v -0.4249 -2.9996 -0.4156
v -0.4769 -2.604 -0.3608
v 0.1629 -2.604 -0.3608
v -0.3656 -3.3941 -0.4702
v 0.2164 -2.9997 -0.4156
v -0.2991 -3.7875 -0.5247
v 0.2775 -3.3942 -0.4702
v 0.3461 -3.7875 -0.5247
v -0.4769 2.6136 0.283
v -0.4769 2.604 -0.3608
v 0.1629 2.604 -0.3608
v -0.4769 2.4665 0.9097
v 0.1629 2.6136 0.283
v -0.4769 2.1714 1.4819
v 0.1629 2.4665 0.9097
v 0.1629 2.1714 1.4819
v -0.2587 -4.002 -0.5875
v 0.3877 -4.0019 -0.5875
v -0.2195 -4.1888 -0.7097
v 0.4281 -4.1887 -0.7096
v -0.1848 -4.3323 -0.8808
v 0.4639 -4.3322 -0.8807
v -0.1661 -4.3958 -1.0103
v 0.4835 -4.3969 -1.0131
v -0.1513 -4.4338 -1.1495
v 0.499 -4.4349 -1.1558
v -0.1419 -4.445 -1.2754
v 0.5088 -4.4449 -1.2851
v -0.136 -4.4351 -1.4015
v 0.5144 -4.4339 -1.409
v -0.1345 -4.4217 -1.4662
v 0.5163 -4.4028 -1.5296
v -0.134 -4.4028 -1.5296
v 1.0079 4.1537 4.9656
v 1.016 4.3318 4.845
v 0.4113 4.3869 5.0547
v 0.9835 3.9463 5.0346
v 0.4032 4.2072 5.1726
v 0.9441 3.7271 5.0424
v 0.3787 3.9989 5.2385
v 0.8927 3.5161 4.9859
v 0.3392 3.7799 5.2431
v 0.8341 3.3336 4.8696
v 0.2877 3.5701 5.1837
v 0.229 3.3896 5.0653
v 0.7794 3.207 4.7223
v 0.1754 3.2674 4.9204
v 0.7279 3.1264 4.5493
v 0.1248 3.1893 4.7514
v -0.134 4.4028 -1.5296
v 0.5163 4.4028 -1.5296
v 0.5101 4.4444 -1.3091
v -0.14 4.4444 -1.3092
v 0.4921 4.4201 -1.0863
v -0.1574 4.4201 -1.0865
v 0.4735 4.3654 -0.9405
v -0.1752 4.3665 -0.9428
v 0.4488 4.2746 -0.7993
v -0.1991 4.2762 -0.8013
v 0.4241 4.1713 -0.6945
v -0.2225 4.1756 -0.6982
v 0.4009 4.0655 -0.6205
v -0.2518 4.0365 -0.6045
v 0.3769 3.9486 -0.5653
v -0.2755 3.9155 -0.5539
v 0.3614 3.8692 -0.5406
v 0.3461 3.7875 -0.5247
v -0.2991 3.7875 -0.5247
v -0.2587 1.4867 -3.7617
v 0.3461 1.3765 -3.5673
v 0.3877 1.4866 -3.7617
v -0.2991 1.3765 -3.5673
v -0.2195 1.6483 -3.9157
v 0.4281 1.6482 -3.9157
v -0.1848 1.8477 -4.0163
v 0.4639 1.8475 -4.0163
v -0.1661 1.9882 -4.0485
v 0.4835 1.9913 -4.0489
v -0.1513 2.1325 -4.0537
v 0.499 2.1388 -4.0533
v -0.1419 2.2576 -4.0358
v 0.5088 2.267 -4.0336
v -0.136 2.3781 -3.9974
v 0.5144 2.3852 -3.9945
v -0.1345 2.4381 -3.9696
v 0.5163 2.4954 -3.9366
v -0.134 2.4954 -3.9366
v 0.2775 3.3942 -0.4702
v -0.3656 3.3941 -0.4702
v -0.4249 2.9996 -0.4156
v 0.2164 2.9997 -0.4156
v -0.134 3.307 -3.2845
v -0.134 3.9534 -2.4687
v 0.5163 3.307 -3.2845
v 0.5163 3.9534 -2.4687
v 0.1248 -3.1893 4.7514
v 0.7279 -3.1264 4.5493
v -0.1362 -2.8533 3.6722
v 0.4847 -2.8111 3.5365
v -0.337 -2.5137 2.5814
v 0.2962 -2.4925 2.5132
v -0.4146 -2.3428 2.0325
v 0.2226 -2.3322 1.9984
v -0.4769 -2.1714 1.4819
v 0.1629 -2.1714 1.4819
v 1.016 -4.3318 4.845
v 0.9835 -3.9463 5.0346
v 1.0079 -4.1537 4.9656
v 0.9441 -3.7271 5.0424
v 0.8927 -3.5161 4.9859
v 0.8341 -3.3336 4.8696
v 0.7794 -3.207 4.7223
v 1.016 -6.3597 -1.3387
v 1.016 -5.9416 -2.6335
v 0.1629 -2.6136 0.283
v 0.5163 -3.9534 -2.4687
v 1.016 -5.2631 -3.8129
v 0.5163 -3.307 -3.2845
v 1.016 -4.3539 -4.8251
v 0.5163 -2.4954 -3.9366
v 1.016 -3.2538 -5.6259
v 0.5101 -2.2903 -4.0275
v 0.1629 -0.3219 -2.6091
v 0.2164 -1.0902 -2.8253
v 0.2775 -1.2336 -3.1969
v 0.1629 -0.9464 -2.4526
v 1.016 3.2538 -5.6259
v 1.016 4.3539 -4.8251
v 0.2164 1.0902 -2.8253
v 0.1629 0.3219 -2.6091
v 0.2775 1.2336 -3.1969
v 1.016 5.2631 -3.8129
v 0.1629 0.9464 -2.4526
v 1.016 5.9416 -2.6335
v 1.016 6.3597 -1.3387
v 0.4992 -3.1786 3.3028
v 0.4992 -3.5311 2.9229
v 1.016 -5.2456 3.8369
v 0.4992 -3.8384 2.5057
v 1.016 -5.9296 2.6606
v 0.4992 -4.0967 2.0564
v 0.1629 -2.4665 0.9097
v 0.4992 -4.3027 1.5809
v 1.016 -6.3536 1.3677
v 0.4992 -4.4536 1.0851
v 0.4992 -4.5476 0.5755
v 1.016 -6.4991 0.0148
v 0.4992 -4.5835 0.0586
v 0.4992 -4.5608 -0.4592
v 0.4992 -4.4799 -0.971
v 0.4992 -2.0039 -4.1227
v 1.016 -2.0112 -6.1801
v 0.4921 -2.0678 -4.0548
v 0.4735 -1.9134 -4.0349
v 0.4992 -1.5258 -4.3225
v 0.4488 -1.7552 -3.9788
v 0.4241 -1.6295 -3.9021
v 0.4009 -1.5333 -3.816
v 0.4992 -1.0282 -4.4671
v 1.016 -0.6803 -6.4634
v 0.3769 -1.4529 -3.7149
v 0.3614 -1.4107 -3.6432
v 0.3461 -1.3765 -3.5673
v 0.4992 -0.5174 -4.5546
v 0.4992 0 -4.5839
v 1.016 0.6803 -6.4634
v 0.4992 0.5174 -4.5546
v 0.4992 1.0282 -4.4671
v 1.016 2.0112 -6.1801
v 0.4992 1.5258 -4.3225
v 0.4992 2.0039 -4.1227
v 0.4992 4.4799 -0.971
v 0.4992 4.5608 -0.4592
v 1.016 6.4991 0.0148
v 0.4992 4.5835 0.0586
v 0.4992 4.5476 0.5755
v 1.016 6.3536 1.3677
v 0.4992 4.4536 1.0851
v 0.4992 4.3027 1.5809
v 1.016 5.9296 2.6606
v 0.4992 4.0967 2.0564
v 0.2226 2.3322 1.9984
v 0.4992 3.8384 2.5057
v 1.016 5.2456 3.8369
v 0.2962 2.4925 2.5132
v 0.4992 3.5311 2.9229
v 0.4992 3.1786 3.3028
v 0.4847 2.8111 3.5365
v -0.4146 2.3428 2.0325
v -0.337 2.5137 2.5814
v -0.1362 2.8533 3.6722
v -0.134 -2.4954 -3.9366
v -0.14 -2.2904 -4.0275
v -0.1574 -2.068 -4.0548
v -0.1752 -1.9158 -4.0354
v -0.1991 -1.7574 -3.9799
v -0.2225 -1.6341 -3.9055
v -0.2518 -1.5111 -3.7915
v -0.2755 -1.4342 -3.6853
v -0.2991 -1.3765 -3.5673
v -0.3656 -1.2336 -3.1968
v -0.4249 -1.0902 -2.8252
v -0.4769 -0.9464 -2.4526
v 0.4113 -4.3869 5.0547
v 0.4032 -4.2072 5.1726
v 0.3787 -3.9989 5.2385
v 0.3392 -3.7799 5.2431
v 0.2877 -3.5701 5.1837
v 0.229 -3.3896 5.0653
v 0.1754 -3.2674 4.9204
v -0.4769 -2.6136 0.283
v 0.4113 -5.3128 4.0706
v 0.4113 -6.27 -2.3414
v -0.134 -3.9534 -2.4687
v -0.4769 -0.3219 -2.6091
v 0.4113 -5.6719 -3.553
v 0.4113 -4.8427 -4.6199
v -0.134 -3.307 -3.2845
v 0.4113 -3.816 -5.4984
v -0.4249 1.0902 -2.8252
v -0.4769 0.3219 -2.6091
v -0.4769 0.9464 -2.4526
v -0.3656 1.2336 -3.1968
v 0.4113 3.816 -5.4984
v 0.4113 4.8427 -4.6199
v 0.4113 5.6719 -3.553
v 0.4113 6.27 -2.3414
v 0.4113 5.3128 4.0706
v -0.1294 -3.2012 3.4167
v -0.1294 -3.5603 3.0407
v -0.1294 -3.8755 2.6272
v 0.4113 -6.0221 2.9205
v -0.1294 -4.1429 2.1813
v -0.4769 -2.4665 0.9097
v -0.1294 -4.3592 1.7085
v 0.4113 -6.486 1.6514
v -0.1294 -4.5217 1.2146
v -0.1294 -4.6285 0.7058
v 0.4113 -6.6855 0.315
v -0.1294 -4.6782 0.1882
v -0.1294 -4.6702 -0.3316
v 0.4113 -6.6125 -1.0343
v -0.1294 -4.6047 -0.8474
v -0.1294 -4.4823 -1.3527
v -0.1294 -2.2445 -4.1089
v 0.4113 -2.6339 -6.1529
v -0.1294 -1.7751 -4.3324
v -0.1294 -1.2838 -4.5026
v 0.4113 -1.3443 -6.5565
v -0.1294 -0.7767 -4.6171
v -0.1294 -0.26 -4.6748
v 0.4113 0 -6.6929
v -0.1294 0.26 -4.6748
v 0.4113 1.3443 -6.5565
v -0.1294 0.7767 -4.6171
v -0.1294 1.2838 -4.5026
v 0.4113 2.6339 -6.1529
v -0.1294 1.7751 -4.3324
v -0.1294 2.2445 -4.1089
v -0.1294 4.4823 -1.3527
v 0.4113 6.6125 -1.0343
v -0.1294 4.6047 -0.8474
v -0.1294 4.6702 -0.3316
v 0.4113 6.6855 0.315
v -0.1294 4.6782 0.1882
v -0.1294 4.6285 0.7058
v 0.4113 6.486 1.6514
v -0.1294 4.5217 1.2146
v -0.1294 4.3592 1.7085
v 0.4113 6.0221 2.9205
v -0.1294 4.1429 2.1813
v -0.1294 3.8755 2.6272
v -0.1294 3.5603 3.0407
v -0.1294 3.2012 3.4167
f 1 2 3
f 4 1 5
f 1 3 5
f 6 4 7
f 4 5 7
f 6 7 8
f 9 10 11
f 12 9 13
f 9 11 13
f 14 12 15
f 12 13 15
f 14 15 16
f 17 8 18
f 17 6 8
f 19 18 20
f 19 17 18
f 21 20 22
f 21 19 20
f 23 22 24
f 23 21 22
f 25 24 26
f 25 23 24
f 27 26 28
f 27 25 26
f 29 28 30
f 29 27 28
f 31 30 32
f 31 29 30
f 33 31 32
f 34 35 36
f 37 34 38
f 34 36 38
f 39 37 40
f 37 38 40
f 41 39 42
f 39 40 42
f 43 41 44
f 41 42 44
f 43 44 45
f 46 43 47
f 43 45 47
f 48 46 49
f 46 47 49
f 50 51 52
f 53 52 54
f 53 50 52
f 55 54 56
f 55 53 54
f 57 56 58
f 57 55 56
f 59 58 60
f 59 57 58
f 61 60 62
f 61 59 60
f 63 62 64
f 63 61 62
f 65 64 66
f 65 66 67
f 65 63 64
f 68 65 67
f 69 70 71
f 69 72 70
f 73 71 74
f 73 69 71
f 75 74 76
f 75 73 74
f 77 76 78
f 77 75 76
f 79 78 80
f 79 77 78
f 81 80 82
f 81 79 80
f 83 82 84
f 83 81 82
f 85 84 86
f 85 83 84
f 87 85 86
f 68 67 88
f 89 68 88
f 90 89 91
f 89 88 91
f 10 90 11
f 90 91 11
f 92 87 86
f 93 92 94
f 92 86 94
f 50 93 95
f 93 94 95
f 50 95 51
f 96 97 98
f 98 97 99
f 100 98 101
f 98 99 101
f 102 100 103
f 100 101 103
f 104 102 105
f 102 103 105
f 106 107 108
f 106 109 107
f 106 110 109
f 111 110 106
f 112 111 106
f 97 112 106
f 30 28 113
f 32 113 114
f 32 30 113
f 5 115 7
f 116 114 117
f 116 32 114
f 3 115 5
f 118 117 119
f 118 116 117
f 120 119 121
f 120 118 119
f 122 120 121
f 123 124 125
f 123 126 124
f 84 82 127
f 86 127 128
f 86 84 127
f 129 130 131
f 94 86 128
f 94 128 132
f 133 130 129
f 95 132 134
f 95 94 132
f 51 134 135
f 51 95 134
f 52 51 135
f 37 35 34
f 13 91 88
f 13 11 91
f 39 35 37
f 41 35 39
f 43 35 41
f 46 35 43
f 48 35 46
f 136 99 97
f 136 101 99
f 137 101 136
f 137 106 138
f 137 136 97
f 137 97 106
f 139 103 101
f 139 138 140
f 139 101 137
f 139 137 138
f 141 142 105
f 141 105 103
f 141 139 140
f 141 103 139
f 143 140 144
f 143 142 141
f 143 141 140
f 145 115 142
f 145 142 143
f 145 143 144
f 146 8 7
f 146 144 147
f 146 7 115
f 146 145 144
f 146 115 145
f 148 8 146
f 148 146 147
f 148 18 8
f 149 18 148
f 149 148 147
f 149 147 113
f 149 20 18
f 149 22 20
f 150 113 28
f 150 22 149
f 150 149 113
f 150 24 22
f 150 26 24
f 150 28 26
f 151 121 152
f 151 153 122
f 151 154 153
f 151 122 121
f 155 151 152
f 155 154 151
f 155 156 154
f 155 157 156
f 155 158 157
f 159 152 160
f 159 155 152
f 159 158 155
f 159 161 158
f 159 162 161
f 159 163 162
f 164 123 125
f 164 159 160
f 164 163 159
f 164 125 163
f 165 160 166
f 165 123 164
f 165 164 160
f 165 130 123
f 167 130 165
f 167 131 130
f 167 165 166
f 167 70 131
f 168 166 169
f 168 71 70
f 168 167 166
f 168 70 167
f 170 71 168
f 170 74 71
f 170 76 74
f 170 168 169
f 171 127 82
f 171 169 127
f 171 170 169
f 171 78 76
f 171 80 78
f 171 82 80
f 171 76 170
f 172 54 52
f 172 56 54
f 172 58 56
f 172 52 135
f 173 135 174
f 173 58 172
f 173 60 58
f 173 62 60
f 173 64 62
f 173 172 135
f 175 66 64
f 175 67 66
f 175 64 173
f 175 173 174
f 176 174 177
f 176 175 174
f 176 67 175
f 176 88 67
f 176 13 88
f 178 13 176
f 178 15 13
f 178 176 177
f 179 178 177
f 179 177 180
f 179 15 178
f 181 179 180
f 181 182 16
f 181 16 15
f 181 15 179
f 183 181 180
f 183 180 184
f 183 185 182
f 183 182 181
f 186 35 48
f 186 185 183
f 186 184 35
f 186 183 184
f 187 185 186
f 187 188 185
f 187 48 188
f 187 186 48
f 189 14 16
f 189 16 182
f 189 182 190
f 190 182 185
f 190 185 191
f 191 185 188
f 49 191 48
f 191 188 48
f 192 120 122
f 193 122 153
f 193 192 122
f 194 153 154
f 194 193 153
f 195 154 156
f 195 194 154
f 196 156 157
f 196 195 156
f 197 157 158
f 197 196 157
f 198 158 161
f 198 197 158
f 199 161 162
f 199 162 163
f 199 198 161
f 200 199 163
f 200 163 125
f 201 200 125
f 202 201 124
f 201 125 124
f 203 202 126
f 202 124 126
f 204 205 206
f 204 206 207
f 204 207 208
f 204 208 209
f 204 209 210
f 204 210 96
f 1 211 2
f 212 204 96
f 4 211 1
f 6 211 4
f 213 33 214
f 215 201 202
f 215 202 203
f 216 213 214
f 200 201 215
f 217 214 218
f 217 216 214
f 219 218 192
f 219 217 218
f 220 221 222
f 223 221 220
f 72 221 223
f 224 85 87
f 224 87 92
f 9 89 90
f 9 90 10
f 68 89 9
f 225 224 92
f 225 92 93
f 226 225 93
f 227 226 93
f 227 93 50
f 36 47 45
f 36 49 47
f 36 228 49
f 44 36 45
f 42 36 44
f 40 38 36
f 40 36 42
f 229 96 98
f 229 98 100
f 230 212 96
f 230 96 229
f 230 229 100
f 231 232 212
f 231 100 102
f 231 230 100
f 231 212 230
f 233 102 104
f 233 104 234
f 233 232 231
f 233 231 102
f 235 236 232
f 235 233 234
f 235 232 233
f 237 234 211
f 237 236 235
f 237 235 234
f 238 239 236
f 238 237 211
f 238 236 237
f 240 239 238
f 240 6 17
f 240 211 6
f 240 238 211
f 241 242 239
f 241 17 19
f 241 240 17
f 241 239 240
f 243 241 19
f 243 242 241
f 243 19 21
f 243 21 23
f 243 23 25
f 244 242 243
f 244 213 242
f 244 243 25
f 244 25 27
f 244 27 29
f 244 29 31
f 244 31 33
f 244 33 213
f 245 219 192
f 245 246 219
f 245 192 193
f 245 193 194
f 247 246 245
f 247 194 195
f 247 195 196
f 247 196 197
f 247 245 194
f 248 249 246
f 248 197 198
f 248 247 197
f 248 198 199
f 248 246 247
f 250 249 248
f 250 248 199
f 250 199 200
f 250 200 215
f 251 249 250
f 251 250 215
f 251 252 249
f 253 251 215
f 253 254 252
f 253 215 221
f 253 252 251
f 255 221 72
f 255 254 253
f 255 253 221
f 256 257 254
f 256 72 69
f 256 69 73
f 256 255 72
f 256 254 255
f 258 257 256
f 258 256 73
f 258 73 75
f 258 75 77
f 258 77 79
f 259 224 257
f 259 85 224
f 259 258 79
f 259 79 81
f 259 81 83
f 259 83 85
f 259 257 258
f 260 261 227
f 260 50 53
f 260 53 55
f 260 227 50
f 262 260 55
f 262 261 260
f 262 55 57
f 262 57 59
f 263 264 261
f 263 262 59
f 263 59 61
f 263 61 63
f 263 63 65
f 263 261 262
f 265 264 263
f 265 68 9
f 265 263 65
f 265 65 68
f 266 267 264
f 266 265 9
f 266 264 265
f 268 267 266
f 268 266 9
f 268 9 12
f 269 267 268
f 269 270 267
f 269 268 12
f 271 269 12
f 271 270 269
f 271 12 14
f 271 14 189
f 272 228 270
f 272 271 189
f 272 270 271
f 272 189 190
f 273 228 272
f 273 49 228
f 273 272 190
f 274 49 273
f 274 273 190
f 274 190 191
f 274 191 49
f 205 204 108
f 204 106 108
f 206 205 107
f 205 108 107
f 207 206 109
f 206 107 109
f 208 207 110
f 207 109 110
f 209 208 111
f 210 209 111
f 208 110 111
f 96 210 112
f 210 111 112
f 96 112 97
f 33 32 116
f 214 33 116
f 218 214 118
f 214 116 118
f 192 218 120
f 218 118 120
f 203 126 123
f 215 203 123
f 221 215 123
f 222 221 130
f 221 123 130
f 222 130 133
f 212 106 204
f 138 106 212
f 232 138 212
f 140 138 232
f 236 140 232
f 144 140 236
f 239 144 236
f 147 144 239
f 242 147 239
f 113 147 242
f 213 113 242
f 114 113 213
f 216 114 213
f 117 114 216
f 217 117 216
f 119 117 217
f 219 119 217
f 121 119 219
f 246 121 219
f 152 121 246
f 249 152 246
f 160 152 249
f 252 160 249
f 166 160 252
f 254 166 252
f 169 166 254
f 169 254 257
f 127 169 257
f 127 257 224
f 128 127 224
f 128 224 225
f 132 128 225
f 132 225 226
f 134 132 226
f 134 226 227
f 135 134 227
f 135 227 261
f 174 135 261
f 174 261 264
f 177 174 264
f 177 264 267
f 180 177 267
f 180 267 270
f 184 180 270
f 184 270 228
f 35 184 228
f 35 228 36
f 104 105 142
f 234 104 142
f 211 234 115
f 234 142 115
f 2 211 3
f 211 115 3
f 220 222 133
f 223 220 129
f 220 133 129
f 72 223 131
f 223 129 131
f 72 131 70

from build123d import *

# Parameters (mm, degrees)
CUT_EXTRUDE1_DEPTH = 10.608101884
FILLET1_R          = 0.762


with BuildPart() as part:
    # Sketch2 → Revolve1 (revolve)
    with BuildSketch(Plane(origin=(0, 0, 0), x_dir=(1, 0, 0), z_dir=(0, 1, 0)), mode=Mode.PRIVATE) as revolve1_sk:
        with BuildLine():
            Line((0.41129695, 6.6929), (1.016, 6.499097983))
            ThreePointArc((1.016, 6.499097983), (0.255533191, 3.289016973), (0, 0))
            Line((0, 0), (-0.635, 0))
            ThreePointArc((-0.635, 0), (-0.371846852, 3.38709491), (0.41129695, 6.6929))
        make_face()
    revolve(revolve1_sk.sketch.rotate(Axis((0, 0, 0), (1, 0, 0)), 180), axis=Axis((0, 0, 0), (1, 0, 0)))

    # Sketch1 → Cut-Extrude1 (cut, through all)
    with BuildSketch(Plane(origin=(1.016, 0, 0), x_dir=(0, 0, -1), z_dir=(1, 0, 0))):
        with BuildLine():
            Line((-5.711929949, -3.488375935), (-1.481934955, -2.171401391))
            ThreePointArc((-1.481934955, -2.171401391), (-0.600870128, -2.559310512), (0.360768614, -2.604027883))
            Line((0.360768614, -2.604027883), (0.639623582, -4.616803059))
            ThreePointArc((0.639623582, -4.616803059), (2.89470911, -3.653032709), (4.34839739, -1.677924))
            Line((4.34839739, -1.677924), (2.45263831, -0.946404))
            ThreePointArc((2.45263831, -0.946404), (2.6289, 0), (2.45263831, 0.946404))
            Line((2.45263831, 0.946404), (4.34839739, 1.677924))
            ThreePointArc((4.34839739, 1.677924), (2.89470911, 3.653032709), (0.639623582, 4.616803059))
            Line((0.639623582, 4.616803059), (0.360768614, 2.604027883))
            ThreePointArc((0.360768614, 2.604027883), (-0.600870128, 2.559310512), (-1.481934955, 2.171401391))
            Line((-1.481934955, 2.171401391), (-5.711929949, 3.488375935))
            ThreePointArc((-5.711929949, 3.488375935), (-6.6929, 0), (-5.711929949, -3.488375935))
        make_face()
    extrude(amount=-CUT_EXTRUDE1_DEPTH, mode=Mode.SUBTRACT)

    # Fillet1
    fillet1_edges = [part.edges().sort_by_distance(p)[0] for p in [
        (0.191190066, 4.616803059, -0.639623582),
        (0.191190066, 1.677924, -4.34839739),
        (0.191190066, -1.677924, -4.34839739),
        (0.191190066, -4.616803059, -0.639623582),
        (0.713662776, -3.458657833, 5.616478276),
        (0.713662776, 3.458657833, 5.616478276),
    ]]
    fillet(fillet1_edges, radius=FILLET1_R)


solid = part.part
